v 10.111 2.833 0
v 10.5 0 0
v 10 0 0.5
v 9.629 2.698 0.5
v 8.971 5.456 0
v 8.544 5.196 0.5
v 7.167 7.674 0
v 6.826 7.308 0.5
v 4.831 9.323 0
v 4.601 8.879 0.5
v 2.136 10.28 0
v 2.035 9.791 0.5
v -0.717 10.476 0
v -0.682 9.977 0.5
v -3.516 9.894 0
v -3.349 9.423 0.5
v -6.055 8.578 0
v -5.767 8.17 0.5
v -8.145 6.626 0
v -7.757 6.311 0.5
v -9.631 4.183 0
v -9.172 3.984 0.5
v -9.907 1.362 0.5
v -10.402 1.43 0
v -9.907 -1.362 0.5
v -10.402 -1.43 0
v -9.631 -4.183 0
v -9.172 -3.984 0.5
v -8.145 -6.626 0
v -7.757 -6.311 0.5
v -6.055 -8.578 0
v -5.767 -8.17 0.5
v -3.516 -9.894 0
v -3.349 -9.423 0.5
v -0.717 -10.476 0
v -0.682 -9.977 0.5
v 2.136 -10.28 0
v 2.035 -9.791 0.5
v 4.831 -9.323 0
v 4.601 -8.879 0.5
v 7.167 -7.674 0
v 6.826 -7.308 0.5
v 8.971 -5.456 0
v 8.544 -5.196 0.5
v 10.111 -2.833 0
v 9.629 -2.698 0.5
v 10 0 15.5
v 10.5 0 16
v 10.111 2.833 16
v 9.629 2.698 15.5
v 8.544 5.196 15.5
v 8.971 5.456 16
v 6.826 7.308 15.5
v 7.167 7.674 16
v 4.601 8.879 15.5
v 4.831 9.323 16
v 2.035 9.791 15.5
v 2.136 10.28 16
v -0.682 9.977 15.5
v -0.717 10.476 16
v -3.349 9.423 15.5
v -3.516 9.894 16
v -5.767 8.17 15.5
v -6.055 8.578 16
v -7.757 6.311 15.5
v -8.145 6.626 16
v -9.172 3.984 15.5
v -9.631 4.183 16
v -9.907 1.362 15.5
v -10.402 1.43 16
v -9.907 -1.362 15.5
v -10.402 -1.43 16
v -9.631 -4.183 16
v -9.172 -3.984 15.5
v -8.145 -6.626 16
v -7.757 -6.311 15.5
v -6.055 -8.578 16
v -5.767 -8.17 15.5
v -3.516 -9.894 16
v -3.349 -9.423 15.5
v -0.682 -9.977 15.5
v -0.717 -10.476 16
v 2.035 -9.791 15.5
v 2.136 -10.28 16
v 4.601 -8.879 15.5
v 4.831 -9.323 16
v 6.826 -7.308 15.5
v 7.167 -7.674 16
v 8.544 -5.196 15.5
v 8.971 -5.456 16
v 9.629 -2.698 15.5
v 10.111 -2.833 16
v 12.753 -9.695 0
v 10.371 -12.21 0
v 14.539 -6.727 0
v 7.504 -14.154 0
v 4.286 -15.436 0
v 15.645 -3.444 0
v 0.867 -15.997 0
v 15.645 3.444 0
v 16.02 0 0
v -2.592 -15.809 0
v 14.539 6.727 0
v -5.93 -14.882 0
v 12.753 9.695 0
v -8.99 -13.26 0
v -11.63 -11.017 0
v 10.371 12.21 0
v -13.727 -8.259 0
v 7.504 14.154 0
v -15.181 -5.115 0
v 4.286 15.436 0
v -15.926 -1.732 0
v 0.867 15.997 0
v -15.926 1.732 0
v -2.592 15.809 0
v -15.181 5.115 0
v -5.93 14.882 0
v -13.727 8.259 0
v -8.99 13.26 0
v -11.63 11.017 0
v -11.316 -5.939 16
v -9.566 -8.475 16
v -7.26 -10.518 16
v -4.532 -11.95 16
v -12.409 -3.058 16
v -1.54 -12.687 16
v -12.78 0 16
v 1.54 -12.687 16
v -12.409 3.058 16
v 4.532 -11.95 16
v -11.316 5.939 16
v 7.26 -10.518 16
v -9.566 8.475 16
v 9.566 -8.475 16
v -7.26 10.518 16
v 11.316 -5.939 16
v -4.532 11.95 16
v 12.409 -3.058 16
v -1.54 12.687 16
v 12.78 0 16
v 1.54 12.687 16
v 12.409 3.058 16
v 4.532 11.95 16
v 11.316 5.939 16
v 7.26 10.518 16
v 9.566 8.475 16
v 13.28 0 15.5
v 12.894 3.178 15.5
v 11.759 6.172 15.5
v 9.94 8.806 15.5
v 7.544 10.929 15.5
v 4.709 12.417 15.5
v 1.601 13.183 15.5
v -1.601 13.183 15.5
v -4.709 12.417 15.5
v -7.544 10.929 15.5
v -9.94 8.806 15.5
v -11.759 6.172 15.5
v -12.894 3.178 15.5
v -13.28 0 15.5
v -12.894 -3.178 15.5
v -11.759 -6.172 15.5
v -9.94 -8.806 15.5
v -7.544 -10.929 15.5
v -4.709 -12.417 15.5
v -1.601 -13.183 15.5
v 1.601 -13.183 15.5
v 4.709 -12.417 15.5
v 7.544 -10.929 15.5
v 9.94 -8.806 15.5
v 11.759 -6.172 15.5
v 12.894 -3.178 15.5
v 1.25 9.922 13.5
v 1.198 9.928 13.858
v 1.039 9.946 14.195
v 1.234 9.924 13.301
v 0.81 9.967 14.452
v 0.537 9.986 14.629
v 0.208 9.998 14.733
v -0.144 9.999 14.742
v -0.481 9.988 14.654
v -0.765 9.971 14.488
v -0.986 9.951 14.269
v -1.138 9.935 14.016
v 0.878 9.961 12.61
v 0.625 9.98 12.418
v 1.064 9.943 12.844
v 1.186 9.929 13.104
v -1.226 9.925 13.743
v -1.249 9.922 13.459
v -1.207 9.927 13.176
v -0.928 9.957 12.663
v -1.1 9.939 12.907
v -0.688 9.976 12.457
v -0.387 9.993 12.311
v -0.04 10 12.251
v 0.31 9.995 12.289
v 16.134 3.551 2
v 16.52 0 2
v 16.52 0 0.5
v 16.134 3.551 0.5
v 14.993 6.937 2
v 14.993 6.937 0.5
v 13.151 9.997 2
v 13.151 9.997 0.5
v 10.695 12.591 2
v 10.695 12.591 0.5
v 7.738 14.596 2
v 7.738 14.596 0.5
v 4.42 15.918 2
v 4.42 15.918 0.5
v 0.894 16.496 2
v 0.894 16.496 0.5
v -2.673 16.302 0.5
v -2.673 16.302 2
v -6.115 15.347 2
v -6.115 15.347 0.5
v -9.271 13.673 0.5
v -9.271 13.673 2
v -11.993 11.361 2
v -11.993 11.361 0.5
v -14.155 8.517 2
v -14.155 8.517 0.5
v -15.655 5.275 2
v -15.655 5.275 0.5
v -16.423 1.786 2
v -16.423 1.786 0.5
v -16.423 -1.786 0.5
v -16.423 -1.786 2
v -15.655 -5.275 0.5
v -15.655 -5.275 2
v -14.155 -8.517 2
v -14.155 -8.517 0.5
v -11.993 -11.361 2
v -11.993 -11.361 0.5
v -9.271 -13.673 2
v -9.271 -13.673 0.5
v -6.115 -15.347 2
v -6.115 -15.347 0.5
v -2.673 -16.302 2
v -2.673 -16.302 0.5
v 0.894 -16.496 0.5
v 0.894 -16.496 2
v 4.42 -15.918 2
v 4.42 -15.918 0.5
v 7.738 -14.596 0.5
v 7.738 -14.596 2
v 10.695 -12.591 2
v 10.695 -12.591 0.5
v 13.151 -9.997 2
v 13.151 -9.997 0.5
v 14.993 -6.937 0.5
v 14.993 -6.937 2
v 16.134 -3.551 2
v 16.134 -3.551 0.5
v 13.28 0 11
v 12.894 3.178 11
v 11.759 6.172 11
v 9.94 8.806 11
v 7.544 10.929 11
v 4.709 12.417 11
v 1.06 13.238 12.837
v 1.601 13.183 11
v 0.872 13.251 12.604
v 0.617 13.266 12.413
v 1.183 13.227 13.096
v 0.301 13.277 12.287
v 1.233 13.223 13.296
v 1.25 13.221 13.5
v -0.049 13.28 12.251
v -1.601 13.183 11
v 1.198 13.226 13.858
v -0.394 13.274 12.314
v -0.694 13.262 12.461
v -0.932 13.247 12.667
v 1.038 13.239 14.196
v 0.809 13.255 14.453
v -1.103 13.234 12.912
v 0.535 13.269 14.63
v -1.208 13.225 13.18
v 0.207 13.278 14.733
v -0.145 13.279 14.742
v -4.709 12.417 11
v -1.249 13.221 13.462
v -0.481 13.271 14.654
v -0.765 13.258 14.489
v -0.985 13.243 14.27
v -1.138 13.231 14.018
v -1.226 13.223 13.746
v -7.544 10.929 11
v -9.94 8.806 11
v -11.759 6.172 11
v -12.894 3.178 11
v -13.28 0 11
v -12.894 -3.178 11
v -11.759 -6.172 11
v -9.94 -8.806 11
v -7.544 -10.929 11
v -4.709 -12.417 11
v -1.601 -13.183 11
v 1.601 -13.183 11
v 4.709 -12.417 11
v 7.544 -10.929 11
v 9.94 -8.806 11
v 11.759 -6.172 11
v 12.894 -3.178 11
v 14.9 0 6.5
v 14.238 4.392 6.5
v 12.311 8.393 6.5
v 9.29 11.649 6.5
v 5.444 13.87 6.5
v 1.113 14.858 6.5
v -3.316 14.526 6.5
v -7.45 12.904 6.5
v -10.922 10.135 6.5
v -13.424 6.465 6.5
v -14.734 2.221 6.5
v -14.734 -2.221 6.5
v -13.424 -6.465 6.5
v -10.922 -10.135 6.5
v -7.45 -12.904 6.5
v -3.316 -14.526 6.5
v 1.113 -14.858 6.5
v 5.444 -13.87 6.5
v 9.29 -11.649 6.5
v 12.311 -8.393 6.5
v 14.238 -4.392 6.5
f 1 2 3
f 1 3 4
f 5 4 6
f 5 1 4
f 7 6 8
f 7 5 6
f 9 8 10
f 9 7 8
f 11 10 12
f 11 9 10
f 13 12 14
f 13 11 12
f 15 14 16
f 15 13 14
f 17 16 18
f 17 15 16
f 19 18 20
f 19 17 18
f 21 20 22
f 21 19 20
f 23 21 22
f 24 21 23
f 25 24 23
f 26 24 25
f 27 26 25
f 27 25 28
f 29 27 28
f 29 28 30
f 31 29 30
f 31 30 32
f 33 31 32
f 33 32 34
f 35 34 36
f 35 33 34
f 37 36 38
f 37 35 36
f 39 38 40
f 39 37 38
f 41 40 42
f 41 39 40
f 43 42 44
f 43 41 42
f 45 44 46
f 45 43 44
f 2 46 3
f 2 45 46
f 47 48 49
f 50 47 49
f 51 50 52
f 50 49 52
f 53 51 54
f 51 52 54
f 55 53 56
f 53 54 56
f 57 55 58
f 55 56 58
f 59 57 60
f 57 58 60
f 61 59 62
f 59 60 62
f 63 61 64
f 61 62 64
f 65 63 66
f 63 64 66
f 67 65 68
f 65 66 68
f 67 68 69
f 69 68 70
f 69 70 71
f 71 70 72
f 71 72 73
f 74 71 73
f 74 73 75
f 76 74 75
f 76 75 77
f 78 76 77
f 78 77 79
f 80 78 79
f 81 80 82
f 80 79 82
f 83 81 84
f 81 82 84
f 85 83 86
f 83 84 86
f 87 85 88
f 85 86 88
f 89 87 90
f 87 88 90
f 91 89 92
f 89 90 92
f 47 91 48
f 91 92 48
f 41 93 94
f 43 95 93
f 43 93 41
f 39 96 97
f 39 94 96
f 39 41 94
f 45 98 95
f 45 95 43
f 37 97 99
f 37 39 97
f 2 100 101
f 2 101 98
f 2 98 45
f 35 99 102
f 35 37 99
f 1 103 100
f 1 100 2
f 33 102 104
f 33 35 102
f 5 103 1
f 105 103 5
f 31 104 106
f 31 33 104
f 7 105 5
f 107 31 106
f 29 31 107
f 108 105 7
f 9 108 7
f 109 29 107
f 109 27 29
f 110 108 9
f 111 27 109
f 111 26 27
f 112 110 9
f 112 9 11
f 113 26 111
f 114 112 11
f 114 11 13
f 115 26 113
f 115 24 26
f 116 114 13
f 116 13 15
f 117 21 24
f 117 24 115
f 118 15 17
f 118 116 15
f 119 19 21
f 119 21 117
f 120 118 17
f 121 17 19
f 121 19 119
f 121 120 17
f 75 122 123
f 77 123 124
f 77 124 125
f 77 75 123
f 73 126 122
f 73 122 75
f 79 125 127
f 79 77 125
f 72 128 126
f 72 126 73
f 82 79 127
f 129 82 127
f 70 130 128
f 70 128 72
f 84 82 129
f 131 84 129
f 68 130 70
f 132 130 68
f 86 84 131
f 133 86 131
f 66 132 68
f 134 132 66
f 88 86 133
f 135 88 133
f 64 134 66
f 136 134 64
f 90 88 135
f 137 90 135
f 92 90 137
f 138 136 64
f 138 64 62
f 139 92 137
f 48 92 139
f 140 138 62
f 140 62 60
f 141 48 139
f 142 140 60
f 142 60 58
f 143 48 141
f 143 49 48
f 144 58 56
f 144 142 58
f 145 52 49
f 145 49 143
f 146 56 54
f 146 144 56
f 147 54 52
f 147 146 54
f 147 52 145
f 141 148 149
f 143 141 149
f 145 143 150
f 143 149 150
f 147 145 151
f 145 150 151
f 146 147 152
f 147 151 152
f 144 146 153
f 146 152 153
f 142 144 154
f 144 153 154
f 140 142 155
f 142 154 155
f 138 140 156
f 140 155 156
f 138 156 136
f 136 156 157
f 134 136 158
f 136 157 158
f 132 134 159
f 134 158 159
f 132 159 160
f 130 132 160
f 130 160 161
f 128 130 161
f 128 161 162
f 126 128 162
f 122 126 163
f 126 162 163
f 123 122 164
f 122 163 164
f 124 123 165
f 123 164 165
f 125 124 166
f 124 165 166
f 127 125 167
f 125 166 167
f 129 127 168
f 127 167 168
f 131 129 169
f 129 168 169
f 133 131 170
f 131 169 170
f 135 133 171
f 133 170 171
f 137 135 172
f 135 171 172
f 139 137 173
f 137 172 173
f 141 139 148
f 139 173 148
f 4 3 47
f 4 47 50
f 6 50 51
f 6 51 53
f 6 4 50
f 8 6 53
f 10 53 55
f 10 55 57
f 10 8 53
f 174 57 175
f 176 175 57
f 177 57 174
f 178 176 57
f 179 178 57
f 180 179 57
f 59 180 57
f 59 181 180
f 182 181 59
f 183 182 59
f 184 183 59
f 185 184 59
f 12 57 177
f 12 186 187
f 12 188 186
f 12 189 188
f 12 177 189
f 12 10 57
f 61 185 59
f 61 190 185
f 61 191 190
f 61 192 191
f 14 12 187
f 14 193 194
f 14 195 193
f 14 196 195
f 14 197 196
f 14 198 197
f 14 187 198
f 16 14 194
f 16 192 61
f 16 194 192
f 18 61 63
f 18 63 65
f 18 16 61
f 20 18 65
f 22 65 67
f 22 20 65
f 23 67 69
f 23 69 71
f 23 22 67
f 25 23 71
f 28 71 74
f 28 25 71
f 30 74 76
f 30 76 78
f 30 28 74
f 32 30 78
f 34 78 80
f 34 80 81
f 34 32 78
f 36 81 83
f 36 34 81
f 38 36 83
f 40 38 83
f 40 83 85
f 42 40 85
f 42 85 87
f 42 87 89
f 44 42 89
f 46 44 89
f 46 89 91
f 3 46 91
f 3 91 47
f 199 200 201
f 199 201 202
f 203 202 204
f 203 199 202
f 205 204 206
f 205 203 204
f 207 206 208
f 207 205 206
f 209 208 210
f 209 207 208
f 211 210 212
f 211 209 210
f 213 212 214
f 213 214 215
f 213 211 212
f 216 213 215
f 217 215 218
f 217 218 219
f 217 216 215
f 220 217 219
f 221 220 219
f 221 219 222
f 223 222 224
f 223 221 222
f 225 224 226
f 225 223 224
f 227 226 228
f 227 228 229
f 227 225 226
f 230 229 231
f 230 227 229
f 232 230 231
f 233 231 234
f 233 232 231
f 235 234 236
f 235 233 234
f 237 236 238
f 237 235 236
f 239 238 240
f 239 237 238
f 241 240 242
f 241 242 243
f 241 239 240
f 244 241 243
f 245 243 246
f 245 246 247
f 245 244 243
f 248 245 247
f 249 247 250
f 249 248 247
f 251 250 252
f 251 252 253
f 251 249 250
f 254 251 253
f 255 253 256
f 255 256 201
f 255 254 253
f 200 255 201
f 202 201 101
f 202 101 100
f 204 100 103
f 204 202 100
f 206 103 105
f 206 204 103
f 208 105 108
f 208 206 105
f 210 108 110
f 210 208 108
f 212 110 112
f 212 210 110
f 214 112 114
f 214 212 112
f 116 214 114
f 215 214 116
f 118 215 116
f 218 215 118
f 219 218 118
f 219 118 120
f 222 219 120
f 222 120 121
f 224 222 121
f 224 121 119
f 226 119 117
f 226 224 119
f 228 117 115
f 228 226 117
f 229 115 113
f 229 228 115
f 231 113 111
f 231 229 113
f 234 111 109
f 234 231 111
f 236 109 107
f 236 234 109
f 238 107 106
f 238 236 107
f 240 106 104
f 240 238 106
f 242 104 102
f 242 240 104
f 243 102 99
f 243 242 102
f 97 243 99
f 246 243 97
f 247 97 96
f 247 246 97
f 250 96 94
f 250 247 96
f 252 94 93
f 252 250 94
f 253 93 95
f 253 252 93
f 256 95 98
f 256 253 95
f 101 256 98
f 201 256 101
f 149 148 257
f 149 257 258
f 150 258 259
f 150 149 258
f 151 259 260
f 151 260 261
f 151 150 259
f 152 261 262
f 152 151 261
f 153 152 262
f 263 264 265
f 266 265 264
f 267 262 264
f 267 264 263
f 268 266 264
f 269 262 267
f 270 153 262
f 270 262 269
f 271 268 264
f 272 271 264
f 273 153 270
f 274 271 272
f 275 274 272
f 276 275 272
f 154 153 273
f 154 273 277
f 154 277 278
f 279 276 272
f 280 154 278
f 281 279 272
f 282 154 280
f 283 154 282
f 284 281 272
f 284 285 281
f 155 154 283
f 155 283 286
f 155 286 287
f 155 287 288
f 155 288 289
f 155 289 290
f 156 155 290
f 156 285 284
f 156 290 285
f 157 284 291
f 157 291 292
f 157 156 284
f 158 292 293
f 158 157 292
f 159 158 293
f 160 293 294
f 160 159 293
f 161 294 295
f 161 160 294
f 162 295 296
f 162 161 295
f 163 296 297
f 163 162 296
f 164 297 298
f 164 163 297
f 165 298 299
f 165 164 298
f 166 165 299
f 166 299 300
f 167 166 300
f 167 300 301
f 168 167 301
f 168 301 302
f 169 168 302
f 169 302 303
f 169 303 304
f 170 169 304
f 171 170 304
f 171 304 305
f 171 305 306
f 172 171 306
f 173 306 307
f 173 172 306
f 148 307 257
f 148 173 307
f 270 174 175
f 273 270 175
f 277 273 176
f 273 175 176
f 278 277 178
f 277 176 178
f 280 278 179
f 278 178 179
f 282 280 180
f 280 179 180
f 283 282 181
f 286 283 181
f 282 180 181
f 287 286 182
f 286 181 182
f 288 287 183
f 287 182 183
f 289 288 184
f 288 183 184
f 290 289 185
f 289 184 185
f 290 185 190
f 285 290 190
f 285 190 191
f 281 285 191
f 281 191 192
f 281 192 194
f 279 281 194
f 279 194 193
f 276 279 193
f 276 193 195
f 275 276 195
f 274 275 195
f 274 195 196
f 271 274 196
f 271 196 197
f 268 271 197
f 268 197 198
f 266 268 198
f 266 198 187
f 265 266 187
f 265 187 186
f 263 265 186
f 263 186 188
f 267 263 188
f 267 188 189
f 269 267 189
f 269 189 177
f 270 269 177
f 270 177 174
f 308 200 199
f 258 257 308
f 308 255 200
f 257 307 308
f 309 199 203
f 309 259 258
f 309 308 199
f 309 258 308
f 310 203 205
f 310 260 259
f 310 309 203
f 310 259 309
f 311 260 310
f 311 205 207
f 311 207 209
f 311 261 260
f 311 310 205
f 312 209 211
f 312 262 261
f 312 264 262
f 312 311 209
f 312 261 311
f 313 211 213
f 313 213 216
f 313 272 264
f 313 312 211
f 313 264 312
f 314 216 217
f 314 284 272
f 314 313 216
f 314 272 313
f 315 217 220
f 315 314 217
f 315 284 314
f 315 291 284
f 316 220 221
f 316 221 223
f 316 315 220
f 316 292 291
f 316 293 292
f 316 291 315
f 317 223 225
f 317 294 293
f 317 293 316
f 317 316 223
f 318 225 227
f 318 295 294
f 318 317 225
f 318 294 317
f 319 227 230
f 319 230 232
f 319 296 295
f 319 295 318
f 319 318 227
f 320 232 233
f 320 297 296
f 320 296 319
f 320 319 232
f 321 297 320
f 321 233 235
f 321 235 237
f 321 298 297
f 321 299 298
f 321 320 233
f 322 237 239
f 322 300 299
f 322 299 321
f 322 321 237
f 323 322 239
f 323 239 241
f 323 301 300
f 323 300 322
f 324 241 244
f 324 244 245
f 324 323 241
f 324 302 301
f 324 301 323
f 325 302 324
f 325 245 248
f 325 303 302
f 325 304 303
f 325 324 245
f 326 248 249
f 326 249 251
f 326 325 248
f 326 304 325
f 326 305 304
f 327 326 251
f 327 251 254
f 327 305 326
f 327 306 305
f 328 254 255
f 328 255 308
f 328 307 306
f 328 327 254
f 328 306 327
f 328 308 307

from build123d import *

# Parameters (mm, degrees)
F3_D     = 2.5
F3_DEPTH = 16.521
F4_SIZE  = 0.5


with BuildPart() as f1:
    # F0 (on Front) → F1 (revolve)
    with BuildSketch(Plane.XZ):
        Polygon((10, 16), (10, 0), (16.52, 0), (16.52, 2), (13.28, 11), (13.28, 15.774938604), (13.28, 16), align=None)
    revolve(axis=Axis((0, 0, 22.1384353936), (0, 0, 1)))

    # F3 (through all, one way)
    with BuildSketch(Plane.XZ):
        with Locations((0, 13.5)):
            Circle(F3_D / 2)
    extrude(amount=-F3_DEPTH, mode=Mode.SUBTRACT)

    # F4
    f4_edges = [f1.edges().sort_by_distance(p)[0] for p in [
        (-13.28, 0, 16),
        (-10, 0, 16),
        (-10, 0, 0),
        (-16.52, 0, 0),
    ]]
    chamfer(f4_edges, length=F4_SIZE)


solid = f1.part
